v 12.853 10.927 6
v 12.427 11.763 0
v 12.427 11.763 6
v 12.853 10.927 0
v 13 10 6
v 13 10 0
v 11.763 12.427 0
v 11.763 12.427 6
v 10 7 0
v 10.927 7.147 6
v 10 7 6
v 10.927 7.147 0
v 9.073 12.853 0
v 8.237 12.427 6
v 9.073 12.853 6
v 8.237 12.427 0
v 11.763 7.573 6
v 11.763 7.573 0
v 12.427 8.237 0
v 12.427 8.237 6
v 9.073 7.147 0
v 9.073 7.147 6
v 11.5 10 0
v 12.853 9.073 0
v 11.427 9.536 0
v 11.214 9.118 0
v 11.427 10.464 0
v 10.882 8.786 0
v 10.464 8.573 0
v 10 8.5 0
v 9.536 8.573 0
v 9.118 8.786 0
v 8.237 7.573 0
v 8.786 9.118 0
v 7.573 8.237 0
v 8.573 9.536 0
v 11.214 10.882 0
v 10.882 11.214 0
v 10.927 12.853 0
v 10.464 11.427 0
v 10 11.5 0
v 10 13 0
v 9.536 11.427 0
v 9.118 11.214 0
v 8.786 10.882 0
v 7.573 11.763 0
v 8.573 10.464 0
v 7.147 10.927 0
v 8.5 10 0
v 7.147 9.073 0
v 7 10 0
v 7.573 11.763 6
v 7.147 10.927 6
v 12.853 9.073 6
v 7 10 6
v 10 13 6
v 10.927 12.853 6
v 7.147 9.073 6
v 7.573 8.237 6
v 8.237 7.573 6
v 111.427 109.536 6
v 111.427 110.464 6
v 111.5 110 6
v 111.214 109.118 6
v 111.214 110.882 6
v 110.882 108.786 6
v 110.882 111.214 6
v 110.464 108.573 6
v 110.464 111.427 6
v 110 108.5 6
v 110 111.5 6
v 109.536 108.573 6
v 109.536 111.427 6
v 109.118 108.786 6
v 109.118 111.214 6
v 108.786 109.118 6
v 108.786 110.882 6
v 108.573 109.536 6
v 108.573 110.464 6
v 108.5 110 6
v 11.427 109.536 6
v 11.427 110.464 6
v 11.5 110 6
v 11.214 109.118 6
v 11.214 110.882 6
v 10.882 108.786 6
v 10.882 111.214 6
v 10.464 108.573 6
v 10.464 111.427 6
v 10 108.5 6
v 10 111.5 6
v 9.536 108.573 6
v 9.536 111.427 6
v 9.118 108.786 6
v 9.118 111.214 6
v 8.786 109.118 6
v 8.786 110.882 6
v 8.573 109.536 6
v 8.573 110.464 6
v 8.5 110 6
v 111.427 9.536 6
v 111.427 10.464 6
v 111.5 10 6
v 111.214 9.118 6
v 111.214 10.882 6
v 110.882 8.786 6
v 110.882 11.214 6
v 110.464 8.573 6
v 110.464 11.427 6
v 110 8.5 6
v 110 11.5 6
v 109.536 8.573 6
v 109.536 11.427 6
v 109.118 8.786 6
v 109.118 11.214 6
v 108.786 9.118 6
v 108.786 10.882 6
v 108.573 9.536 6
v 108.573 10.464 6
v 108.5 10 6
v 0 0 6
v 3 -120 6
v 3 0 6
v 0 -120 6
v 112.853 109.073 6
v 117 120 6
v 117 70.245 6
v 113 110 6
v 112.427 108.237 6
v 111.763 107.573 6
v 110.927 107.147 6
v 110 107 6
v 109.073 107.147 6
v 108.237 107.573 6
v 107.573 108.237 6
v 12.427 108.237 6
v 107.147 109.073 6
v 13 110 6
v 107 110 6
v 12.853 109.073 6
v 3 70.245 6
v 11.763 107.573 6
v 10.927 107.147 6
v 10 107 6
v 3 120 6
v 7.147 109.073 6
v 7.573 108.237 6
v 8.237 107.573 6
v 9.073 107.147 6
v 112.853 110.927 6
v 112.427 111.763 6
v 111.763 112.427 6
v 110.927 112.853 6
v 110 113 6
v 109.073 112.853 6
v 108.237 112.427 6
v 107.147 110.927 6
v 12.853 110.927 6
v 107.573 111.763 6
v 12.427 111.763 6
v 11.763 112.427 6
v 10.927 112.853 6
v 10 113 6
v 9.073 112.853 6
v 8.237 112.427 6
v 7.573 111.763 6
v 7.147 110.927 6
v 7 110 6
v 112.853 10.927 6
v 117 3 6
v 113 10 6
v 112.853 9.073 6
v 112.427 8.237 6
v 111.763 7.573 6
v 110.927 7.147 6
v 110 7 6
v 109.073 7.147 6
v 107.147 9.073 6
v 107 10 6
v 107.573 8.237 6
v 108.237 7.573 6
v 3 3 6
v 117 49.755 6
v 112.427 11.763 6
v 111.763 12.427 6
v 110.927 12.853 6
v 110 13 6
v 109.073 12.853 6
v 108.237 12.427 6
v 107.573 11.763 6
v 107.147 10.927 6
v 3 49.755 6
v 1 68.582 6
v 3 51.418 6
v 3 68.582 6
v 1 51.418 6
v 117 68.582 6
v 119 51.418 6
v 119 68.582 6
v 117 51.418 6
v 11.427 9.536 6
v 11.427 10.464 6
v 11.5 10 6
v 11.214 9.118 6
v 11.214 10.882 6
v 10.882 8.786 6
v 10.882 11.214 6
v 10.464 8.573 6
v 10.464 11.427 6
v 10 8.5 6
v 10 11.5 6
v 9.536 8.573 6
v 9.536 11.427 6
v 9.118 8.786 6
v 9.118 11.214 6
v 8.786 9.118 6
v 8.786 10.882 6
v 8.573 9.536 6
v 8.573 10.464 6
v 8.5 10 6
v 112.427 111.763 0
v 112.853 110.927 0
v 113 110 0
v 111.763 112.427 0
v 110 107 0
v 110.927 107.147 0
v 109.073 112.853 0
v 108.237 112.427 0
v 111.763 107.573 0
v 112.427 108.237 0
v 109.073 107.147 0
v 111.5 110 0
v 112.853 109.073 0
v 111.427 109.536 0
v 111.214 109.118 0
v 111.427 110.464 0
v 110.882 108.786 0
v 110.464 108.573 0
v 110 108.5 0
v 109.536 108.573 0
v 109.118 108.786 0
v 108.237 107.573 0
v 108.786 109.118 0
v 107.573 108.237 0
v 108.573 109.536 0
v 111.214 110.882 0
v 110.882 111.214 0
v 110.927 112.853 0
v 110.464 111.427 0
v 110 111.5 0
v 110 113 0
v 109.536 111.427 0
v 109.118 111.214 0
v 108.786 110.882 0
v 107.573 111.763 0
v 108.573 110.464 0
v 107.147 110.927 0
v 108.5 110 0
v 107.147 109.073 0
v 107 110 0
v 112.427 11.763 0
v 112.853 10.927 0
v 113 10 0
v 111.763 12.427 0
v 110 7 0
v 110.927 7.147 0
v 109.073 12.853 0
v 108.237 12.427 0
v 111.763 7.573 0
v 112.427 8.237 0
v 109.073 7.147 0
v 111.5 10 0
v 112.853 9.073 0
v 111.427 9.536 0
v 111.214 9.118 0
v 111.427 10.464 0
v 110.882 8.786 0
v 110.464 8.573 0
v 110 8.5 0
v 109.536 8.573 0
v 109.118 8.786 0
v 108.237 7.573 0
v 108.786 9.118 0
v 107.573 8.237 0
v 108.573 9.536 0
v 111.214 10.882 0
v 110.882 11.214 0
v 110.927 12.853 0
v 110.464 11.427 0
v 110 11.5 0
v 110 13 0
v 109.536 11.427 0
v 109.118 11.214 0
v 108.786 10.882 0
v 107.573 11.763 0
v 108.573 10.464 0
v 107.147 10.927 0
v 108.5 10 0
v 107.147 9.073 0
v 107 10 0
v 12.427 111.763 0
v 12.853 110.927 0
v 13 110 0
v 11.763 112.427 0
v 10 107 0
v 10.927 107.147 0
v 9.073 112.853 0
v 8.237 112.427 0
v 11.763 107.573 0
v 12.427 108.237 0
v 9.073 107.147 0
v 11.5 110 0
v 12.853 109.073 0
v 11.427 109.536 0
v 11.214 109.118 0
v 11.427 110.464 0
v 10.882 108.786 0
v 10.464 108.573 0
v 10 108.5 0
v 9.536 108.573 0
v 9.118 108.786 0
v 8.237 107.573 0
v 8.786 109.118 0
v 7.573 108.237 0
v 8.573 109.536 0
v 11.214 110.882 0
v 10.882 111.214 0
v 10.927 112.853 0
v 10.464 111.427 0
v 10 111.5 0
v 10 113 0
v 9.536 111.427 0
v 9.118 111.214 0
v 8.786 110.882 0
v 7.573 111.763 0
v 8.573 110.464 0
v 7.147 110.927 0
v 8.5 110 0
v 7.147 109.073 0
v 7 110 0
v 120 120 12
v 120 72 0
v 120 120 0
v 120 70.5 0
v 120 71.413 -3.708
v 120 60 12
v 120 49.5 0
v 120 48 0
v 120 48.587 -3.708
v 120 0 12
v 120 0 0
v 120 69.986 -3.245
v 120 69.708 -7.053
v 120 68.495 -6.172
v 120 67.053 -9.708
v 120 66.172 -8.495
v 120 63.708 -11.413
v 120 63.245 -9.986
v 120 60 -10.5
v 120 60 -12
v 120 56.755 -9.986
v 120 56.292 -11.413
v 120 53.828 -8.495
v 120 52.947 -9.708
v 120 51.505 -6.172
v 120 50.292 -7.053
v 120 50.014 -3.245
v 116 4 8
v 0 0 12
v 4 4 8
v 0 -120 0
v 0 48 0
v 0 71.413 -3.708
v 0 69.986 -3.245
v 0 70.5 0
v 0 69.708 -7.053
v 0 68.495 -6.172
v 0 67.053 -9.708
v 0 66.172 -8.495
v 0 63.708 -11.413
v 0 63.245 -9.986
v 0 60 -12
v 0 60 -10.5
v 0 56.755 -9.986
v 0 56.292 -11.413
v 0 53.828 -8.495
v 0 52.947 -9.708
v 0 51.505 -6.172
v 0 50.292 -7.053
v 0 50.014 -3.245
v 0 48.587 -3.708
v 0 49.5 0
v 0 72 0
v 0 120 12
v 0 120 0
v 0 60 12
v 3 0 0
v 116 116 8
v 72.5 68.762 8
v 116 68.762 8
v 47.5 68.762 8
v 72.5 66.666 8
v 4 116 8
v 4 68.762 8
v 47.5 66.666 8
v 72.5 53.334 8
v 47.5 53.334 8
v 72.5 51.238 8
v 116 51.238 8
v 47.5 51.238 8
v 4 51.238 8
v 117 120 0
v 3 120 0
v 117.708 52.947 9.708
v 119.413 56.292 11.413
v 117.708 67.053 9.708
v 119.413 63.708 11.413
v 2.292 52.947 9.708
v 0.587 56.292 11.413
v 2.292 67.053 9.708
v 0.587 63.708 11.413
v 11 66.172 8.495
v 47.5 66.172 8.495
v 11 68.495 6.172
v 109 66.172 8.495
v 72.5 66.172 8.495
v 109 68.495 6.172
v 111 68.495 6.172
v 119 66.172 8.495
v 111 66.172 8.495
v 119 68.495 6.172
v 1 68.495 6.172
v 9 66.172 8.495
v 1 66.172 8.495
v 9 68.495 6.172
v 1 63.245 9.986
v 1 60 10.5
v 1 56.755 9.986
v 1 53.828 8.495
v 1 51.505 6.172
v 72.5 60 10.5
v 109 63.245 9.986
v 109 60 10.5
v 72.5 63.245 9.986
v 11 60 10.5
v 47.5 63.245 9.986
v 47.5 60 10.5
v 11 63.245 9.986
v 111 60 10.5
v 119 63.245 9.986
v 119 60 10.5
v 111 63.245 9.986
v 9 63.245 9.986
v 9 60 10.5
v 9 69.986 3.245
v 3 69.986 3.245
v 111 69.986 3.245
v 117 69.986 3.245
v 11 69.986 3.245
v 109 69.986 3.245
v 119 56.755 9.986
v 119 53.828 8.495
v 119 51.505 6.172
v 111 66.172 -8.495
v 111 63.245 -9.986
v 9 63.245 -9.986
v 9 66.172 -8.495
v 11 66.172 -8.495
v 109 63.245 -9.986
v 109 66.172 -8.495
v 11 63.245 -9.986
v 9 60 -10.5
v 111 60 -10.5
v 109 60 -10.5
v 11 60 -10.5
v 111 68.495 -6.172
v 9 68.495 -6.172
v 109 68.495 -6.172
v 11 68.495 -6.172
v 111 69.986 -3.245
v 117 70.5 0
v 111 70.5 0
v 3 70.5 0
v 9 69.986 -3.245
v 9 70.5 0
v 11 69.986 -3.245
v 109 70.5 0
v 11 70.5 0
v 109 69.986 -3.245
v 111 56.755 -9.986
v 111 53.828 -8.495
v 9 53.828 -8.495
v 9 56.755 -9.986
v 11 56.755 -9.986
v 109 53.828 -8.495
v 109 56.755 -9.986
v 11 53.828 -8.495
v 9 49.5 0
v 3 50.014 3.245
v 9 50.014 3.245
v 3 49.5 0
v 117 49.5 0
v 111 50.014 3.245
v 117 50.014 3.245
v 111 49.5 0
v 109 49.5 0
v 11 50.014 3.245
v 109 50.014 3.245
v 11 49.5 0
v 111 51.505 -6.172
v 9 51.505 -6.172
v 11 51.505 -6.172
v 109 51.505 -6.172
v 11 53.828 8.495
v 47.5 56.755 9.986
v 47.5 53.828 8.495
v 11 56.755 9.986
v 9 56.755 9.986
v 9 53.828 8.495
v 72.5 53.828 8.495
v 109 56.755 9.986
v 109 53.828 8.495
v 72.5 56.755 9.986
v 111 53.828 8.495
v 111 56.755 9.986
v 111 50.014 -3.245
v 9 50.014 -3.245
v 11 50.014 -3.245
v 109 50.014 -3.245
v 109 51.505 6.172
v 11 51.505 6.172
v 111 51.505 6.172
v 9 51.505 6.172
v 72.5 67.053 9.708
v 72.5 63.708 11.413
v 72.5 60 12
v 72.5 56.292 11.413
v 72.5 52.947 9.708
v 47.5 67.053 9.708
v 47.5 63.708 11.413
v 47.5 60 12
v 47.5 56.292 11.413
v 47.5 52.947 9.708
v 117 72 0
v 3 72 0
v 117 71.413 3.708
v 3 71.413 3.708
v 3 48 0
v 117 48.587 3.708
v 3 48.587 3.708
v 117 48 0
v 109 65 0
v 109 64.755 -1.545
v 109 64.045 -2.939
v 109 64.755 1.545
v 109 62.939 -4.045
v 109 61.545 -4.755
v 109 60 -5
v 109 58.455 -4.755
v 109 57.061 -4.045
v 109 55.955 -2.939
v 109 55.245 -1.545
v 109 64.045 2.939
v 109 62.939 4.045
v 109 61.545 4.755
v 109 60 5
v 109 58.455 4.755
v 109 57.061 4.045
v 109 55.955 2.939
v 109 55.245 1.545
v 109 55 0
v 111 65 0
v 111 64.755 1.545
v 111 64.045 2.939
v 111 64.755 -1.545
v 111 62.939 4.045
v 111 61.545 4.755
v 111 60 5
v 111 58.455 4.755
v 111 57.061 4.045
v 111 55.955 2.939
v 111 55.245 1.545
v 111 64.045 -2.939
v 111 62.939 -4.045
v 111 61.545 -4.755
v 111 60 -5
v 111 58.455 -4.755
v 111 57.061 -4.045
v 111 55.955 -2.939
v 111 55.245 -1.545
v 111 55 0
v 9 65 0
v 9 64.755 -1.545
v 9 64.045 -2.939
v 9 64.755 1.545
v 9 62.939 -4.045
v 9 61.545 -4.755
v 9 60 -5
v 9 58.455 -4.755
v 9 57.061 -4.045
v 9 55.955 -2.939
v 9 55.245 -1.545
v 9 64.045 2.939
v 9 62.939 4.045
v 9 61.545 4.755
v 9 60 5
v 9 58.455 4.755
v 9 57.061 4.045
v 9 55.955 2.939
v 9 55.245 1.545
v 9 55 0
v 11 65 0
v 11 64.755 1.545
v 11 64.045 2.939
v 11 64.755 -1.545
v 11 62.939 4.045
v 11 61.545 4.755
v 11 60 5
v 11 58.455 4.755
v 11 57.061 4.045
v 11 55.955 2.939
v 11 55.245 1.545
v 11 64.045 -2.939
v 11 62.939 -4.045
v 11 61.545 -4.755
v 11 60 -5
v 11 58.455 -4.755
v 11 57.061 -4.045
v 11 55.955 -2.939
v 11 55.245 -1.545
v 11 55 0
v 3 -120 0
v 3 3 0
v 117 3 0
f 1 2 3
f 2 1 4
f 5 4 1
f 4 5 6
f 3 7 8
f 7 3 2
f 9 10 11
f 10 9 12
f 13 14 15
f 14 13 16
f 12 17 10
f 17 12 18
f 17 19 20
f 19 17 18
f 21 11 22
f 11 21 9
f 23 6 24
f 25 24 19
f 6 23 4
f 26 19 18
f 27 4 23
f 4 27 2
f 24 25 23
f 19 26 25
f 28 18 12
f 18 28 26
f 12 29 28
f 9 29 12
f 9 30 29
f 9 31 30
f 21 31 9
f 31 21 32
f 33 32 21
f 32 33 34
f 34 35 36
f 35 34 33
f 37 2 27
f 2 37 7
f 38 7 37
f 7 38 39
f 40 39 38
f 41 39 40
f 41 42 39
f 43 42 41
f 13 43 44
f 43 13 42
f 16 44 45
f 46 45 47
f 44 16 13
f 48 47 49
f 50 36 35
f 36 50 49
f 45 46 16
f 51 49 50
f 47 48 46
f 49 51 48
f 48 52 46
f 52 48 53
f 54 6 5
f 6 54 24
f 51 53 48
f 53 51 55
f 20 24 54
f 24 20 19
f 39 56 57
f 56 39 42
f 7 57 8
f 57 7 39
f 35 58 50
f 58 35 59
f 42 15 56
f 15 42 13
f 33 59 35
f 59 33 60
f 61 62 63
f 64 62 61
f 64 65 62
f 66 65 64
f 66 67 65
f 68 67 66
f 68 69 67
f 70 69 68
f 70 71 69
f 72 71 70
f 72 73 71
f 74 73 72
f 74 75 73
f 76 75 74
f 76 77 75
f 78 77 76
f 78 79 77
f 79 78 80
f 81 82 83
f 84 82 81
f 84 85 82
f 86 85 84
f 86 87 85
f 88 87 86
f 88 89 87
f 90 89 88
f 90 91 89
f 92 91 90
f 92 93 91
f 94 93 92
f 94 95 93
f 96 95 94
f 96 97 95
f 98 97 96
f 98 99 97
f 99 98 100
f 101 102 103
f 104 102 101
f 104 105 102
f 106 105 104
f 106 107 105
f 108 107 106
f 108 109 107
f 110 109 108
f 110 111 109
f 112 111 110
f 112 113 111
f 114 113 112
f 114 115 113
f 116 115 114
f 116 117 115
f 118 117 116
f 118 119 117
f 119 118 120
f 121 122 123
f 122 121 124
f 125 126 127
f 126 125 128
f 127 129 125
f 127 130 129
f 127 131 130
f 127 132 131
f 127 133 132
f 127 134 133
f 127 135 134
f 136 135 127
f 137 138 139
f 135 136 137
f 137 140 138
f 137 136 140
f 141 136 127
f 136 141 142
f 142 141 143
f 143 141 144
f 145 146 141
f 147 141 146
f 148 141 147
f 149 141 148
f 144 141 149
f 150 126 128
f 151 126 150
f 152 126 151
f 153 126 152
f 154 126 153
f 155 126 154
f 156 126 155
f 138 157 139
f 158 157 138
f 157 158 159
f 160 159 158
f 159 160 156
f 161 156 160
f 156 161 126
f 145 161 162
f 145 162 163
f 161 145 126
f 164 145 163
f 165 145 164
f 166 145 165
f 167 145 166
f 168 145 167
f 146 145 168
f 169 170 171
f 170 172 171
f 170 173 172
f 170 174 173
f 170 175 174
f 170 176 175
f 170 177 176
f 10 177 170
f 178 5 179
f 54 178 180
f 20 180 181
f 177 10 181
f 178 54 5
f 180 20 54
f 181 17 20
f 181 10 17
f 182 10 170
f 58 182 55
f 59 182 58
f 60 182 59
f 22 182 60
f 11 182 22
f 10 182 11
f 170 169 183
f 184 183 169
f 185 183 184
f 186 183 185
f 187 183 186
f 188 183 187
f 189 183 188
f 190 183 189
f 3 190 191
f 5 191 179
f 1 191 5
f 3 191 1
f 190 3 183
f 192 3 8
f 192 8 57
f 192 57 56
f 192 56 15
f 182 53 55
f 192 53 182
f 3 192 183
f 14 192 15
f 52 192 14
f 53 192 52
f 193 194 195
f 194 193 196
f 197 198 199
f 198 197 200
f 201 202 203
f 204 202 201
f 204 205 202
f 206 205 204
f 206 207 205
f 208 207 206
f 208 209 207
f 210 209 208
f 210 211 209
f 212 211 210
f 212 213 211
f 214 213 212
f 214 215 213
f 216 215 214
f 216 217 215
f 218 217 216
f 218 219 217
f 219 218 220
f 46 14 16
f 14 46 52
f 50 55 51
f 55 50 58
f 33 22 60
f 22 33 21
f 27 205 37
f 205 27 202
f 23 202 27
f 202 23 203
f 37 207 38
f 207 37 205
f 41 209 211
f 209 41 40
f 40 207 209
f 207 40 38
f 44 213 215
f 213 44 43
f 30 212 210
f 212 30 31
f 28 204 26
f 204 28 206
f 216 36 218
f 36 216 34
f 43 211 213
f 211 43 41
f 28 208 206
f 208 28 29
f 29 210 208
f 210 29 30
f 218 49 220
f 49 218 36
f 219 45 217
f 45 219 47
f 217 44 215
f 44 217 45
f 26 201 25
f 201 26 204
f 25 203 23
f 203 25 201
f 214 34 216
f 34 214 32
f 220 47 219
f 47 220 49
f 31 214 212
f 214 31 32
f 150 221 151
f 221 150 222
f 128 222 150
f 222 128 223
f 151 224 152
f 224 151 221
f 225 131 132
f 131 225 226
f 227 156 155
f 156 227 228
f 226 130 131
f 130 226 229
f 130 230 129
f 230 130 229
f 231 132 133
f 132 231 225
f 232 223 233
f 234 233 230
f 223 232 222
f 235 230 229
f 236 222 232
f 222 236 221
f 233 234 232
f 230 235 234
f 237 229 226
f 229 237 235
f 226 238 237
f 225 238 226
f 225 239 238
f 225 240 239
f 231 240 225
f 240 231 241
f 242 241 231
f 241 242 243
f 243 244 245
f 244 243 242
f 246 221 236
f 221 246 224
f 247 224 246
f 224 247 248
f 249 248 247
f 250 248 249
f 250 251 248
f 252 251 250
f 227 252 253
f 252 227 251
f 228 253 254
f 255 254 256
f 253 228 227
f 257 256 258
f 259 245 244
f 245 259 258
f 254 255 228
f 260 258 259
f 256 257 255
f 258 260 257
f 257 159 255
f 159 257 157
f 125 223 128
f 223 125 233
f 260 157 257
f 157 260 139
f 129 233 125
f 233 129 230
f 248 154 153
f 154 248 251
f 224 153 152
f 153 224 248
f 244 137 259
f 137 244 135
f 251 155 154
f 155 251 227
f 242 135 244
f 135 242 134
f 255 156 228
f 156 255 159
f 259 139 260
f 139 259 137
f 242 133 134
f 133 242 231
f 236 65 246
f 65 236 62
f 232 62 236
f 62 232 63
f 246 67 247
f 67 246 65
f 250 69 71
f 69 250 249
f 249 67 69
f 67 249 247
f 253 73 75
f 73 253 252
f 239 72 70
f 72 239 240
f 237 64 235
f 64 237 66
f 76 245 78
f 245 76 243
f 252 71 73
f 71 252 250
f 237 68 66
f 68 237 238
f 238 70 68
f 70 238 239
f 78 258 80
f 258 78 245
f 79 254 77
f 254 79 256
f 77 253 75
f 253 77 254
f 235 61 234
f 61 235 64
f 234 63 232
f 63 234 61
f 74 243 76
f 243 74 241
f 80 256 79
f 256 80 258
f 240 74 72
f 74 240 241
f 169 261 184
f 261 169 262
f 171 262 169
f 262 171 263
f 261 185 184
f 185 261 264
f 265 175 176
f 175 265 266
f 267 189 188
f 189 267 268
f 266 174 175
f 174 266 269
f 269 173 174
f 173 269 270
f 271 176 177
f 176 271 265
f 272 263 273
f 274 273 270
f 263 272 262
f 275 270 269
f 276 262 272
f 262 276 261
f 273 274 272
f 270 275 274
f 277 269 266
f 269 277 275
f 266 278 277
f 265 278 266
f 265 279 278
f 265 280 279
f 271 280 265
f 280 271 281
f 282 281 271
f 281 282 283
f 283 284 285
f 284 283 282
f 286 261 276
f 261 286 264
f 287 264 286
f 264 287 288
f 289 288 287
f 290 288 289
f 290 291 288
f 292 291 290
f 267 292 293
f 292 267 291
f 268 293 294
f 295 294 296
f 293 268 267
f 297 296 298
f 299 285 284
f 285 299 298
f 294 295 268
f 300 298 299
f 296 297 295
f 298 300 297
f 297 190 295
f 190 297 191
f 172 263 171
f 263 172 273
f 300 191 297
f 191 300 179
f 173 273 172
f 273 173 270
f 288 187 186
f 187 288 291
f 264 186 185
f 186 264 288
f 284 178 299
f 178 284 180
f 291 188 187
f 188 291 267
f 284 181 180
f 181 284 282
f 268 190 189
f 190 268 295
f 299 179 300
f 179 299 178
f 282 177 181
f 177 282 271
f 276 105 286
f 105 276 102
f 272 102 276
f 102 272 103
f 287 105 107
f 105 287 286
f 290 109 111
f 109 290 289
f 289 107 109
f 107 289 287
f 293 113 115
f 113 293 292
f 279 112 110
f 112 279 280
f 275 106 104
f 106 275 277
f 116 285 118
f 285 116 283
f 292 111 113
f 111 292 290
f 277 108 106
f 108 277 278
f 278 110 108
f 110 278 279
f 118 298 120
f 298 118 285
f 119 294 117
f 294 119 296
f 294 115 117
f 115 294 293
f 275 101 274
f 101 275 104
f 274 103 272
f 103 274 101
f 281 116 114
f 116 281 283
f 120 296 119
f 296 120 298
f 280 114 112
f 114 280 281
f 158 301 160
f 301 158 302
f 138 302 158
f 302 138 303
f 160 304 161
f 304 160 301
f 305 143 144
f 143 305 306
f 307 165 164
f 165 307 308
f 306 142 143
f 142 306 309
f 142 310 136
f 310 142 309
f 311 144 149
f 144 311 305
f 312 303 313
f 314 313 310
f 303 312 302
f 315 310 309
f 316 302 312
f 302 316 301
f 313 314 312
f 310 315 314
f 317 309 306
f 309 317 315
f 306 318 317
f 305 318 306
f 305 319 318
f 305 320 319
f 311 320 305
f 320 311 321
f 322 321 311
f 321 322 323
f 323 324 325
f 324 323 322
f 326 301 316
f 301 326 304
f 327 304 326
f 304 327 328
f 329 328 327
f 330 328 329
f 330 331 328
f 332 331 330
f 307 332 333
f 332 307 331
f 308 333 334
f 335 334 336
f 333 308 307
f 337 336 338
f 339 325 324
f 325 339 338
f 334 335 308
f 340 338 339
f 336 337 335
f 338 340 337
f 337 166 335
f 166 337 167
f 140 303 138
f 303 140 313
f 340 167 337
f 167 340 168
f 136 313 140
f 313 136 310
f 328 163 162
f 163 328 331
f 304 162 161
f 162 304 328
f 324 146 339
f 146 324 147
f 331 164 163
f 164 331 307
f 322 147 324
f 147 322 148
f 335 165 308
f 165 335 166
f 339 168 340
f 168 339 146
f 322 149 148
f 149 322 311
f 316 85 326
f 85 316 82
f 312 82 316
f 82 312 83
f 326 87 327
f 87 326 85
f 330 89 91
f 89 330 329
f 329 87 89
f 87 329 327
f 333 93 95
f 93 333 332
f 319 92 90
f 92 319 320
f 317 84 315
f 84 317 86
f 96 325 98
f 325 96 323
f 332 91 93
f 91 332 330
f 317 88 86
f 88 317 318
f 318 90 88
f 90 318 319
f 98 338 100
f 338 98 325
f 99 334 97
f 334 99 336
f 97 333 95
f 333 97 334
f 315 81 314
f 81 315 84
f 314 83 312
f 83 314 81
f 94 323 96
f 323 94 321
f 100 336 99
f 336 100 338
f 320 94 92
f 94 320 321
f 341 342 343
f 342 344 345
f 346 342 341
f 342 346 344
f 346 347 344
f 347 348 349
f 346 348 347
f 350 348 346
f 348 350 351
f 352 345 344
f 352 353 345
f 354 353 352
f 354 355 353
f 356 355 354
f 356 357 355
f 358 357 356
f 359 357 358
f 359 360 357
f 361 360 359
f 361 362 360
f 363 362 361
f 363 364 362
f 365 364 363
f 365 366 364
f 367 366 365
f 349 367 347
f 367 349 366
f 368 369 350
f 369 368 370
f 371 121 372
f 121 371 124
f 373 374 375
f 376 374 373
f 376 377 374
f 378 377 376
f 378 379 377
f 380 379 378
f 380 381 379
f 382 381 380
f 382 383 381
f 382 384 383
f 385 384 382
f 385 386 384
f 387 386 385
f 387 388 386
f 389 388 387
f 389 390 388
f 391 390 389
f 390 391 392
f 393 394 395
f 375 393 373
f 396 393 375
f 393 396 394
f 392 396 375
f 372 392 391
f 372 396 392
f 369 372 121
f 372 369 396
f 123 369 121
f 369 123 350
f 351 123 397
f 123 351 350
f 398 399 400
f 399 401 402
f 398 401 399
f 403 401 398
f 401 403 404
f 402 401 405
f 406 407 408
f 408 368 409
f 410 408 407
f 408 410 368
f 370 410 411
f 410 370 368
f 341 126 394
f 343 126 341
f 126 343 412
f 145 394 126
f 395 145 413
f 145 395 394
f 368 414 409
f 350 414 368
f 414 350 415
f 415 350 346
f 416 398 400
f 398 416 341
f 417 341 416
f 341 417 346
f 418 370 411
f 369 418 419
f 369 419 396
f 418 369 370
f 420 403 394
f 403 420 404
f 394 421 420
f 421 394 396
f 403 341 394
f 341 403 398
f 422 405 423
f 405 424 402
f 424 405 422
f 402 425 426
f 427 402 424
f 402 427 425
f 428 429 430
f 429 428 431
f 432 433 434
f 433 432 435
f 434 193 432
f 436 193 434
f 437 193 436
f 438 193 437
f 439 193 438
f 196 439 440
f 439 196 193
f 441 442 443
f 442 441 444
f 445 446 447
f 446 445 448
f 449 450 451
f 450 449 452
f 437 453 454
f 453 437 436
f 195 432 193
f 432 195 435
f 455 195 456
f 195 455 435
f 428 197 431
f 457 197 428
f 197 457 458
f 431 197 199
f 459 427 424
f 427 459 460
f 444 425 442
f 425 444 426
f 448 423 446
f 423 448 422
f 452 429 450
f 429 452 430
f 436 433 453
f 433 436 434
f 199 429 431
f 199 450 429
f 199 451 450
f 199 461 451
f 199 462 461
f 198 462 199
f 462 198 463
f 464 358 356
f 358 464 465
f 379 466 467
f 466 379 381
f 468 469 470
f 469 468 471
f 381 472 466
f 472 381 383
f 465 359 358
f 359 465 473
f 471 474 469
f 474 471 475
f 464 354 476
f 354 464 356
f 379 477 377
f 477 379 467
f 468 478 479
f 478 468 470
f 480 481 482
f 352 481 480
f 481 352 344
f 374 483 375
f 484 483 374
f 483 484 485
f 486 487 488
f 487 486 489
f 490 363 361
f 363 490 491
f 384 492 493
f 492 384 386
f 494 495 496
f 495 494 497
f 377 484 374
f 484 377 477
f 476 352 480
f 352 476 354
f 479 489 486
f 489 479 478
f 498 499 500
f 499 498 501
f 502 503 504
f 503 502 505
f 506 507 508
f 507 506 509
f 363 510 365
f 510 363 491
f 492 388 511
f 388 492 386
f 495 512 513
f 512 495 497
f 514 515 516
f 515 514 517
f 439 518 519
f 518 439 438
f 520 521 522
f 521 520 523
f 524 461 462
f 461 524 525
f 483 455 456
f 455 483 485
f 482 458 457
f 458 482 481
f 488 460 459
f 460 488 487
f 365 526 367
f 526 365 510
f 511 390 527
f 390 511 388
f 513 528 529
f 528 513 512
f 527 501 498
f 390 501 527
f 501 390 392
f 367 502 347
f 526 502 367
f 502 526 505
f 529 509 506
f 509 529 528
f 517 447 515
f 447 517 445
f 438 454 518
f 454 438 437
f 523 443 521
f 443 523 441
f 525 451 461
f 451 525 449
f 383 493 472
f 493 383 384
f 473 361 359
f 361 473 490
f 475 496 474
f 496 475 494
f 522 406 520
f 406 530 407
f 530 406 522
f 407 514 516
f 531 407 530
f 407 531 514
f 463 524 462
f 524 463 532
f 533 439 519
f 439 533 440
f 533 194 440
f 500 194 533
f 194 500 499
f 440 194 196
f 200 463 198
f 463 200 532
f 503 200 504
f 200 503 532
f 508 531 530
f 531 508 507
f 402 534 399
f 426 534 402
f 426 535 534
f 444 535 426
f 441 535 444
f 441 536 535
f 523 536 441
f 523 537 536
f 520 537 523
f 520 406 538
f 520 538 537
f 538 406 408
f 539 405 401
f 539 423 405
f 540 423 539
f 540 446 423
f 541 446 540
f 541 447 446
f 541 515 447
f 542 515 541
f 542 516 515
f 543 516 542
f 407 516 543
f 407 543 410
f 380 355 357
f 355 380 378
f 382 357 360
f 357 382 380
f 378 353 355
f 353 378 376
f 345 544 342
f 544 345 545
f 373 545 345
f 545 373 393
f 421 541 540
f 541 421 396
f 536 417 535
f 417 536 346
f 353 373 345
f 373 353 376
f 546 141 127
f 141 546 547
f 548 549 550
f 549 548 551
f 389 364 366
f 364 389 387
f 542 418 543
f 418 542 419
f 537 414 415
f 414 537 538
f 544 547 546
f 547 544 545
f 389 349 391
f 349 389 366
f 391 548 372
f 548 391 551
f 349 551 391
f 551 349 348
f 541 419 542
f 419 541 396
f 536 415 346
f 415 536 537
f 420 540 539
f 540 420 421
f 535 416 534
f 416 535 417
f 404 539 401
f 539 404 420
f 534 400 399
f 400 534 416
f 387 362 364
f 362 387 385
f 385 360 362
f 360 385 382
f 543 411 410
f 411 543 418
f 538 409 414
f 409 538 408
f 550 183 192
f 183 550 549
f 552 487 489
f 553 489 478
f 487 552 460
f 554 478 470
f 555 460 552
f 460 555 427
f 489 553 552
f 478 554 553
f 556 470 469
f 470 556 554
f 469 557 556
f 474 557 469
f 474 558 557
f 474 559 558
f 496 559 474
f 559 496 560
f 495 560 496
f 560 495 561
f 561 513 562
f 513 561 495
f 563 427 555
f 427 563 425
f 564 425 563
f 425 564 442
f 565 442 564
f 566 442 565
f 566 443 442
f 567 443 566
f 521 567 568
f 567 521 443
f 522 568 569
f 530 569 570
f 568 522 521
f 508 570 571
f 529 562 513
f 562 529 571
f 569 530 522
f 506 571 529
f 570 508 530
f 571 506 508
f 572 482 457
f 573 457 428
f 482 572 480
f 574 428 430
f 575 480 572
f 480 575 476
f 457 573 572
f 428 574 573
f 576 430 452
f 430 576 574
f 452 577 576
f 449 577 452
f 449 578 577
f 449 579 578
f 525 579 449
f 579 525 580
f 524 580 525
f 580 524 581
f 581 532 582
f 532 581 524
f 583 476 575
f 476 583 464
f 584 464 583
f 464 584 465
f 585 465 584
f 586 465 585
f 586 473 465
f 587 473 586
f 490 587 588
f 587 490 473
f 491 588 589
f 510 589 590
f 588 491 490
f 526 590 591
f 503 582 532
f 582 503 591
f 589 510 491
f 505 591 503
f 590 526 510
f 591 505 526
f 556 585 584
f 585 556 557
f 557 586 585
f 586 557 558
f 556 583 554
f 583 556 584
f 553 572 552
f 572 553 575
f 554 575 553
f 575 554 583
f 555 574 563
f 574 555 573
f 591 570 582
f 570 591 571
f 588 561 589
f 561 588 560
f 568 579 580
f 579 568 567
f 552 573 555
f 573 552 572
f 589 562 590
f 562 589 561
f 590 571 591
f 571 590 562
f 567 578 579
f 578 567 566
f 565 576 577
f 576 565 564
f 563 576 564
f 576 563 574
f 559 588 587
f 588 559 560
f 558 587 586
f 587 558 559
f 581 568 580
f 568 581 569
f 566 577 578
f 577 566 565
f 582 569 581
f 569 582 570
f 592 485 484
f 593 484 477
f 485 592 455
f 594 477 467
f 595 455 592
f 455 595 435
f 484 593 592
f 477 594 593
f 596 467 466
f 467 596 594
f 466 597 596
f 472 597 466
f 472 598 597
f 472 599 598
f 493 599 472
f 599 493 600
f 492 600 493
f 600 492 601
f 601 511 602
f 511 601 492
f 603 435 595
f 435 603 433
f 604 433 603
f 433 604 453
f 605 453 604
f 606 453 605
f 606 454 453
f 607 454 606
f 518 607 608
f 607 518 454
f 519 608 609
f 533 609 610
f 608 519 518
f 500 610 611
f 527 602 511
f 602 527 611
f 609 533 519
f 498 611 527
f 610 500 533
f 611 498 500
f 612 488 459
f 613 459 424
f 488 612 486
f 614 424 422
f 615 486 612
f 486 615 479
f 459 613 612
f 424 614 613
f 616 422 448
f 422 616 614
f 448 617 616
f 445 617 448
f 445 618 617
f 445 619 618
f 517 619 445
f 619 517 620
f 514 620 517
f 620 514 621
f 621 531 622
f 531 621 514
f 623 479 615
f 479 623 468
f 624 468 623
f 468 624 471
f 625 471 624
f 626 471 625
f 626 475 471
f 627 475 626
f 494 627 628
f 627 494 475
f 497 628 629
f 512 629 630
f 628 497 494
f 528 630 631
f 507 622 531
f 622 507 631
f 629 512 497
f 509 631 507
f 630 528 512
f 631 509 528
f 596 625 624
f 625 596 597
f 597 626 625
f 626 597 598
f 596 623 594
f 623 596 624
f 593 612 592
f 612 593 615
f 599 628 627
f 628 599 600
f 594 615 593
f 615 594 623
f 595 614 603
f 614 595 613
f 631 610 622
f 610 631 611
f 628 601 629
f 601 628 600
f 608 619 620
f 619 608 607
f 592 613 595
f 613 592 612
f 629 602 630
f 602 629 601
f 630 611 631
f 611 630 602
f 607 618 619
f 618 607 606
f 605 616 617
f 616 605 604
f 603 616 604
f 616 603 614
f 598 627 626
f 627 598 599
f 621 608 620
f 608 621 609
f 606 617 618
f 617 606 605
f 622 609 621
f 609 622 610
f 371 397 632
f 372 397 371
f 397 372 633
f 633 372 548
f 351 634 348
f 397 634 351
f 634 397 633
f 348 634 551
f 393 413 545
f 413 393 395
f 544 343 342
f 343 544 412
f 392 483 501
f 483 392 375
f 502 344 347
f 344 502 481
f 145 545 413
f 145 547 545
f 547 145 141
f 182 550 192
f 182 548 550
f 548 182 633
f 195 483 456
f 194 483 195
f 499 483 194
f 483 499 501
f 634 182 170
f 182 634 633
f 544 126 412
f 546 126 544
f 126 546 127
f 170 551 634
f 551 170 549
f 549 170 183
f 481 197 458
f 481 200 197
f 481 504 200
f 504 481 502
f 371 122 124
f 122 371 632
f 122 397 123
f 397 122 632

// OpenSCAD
$fa=1;
$fn=20;

module rotate_handle(long, larg, attach, grip) {
    cylinder(h=long,d=larg);
//    rotate([0,0,90]) translate([0,larg/2,0]) cylinder(h=long,d=grip);
    for (i=[0:20:350]) {
        rotate([0,0,i]) translate([0,larg/2,0]) cylinder(h=long,d=grip);
    }
    translate([0,0,long+attach/2]) cube([attach,attach,attach], center=true);
    }

module rotate_piece() {
    // handle extension
    translate([10,0,0]) rotate([0,90,0]) cylinder(h=30,d=10);
    translate([40,0,0]) cube([10,5,5], center=true);
    // rotation support
    translate([-40,0,0]) rotate([0,90,0]) cylinder(h=30,d=10);
    difference() {
    // main
    rotate([0,90,0]) cylinder(h=20,d=18, center=true);
    // hole
    sphere(d=11);
    translate([0,0,10]) cylinder(h=20,d=11, center=true);
    translate([0,0,9]) cube([22,11,4], center=true);
    }
}

module rotate_piece_2(base_size, main_diam, shaft_diam) {
    difference() {
    union() {
    // shaft
    cylinder(h=base_size,d=shaft_diam, center=true);
    translate([0,0,base_size/2]) cube([4,4,8], center=true);
    // ball catch
    cylinder(h=20,d=main_diam, center=true);
    }

    translate([-main_diam/4,0,0]) rotate([0,90,0]) cylinder(h=main_diam/2,d=13, d2=11,center=true);
    sphere(d=11);
}
}


module picot_male() {
//    translate([3,-15,0]) rotate([0,90,0]) union() {
//        cylinder(h=6,d=6, center=true);   
//        cylinder(h=10,d=3, center=true);   
//    }
        cylinder(h=6,d=6, center=true);   
        cylinder(h=10,d=3, center=true);   
    
    }

module picot_female (x, y) {
    translate([x,y,-3]) difference () {
    cylinder(h=6,d=6, center=true);   
    cylinder(h=6,d=3, center=true);   
    }      
    }

module rotate_floor(base_size, base_height, corner_size) {

    picot_female(10,10);
    picot_female(110,110);
    picot_female(110,10);
    picot_female(10,110);
   
    triangle_points =[[0,0],[corner_size,0],[0,corner_size]];
    triangle_paths =[[0,1,2]];
    translate([base_size,0,base_height]) rotate([0,-90,0]) linear_extrude(base_size) polygon(triangle_points,triangle_paths,10);
    translate([base_size,base_size,base_height]) rotate([90,-90,0]) linear_extrude(base_size) polygon(triangle_points,triangle_paths,10);
    translate([0,0,base_height]) rotate([-90,-90,0]) linear_extrude(base_size) polygon(triangle_points,triangle_paths,10);
    translate([0,base_size,base_height]) rotate([180,-90,0]) linear_extrude(base_size) polygon(triangle_points,triangle_paths,10);
    
    cube([base_size,base_size,base_height], center=false);
    
//    difference() {
//    // base
//    cube([base_size,base_size,base_height], center=false);
//    // hole
//    translate([60,60,0]) cylinder(h=base_height,d=13, d2=13);
//    }
}

//rotate_piece();

difference () {
    translate([0,0,6]) rotate_floor(120,2,4);
    union () {
        
        translate([60,60,0]) rotate([0,90,0]) cylinder(h=118,d=21, center=true);
    }}

translate([60,60,0]) rotate([0,90,0])  {
    
    difference() {
    
                    cylinder(h=120,d=24, center=true);
    union() {
                    cylinder(h=120,d=21, center=true);
         translate([-13,0,0]) cube([10,25,25], center=true);
                }}}
// supports
translate([60,60,0]) rotate([0,90,0]) {
    difference() {
    translate([0,0,50]) cylinder(h=2,d=21, center=true);
    cylinder(h=120,d=10, center=true);
}  
difference () {
                translate([0,0,-50]) cylinder(h=2,d=21, center=true);
                cylinder(h=120,d=10, center=true);
            }
 }   

 // jupe
translate([0,120,0]) rotate([0,0,-90]) cube([120,3,6]);
cube([120,3,6]);
translate([120,0,0]) rotate([0,0,90])  cube([120,3,6]);
 rotate([0,0,-90]) cube([120,3,6]);

module attempt_2 () {
difference () {

    union () {
        
        union() {
            // supports
            difference() {
                translate([0,0,50]) cylinder(h=2,d=21, center=true);
                cylinder(h=120,d=10, center=true);
            }
            difference () {
                translate([0,0,-50]) cylinder(h=2,d=21, center=true);
                cylinder(h=120,d=10, center=true);
            }
            //cylinder(h=120,d=10, center=true);
            
            // tunnel
            difference() {
                difference() {
                    cylinder(h=120,d=23, center=true);
                    cylinder(h=120,d=21, center=true);
                }
            // ball opening
            cube([25,25,25], center=true);
            
        }
        }

        // base
        difference() {
            rotate([0,90,0]) cube([120,120,4], center=true);
            cylinder(h=120,d=21, center=true);
                }
    }       
            
translate([15,0,0]) rotate([0,90,0]) cube([140,140,30], center=true);            
}        
        
// picots

// males
translate([3,-15,0]) rotate([0,90,0]) union() {
    cylinder(h=6,d=6, center=true);   
    cylinder(h=10,d=3, center=true);   
}
// femelle
translate([3,15,0]) rotate([0,90,0])  difference () {
cylinder(h=6,d=6, center=true);   
cylinder(h=6,d=3, center=true);   
}

translate([3,50,50]) rotate([0,90,0]) cylinder(h=6,d=6, center=true);   
translate([3,50,-50]) rotate([0,90,0]) cylinder(h=6,d=6, center=true);   
translate([3,-50,50]) rotate([0,90,0]) cylinder(h=6,d=6, center=true);   
translate([3,-50,-50]) rotate([0,90,0]) cylinder(h=6,d=6, center=true);   

translate([3,15,0]) rotate([0,90,0])  difference () {
cylinder(h=6,d=6, center=true);   
cylinder(h=6,d=3, center=true);   
}
        

}
//rotate_piece_2(120, 20, 6);


//translate([0,0,-2]) rotate_floor(120, 4, 5);


//rotate([0,90,0]) rotate_handle(25, 25, 5, 3);

//translate([60,60,-10]) rotate_piece();



module rotate_floor_tube(base_size, main_diam) {

    difference() {
cylinder(h=base_size,d=main_diam+3, center=true);
translate([0,0,2]) cylinder(h=base_size,d=main_diam+1, center=true);   
}

}
//translate([25,60,-0]) rotate([0,90,0])  rotate_floor_tube(50, 20);
//translate([95,60,-0]) rotate([0,-90,0])  rotate_floor_tube(50, 20);
